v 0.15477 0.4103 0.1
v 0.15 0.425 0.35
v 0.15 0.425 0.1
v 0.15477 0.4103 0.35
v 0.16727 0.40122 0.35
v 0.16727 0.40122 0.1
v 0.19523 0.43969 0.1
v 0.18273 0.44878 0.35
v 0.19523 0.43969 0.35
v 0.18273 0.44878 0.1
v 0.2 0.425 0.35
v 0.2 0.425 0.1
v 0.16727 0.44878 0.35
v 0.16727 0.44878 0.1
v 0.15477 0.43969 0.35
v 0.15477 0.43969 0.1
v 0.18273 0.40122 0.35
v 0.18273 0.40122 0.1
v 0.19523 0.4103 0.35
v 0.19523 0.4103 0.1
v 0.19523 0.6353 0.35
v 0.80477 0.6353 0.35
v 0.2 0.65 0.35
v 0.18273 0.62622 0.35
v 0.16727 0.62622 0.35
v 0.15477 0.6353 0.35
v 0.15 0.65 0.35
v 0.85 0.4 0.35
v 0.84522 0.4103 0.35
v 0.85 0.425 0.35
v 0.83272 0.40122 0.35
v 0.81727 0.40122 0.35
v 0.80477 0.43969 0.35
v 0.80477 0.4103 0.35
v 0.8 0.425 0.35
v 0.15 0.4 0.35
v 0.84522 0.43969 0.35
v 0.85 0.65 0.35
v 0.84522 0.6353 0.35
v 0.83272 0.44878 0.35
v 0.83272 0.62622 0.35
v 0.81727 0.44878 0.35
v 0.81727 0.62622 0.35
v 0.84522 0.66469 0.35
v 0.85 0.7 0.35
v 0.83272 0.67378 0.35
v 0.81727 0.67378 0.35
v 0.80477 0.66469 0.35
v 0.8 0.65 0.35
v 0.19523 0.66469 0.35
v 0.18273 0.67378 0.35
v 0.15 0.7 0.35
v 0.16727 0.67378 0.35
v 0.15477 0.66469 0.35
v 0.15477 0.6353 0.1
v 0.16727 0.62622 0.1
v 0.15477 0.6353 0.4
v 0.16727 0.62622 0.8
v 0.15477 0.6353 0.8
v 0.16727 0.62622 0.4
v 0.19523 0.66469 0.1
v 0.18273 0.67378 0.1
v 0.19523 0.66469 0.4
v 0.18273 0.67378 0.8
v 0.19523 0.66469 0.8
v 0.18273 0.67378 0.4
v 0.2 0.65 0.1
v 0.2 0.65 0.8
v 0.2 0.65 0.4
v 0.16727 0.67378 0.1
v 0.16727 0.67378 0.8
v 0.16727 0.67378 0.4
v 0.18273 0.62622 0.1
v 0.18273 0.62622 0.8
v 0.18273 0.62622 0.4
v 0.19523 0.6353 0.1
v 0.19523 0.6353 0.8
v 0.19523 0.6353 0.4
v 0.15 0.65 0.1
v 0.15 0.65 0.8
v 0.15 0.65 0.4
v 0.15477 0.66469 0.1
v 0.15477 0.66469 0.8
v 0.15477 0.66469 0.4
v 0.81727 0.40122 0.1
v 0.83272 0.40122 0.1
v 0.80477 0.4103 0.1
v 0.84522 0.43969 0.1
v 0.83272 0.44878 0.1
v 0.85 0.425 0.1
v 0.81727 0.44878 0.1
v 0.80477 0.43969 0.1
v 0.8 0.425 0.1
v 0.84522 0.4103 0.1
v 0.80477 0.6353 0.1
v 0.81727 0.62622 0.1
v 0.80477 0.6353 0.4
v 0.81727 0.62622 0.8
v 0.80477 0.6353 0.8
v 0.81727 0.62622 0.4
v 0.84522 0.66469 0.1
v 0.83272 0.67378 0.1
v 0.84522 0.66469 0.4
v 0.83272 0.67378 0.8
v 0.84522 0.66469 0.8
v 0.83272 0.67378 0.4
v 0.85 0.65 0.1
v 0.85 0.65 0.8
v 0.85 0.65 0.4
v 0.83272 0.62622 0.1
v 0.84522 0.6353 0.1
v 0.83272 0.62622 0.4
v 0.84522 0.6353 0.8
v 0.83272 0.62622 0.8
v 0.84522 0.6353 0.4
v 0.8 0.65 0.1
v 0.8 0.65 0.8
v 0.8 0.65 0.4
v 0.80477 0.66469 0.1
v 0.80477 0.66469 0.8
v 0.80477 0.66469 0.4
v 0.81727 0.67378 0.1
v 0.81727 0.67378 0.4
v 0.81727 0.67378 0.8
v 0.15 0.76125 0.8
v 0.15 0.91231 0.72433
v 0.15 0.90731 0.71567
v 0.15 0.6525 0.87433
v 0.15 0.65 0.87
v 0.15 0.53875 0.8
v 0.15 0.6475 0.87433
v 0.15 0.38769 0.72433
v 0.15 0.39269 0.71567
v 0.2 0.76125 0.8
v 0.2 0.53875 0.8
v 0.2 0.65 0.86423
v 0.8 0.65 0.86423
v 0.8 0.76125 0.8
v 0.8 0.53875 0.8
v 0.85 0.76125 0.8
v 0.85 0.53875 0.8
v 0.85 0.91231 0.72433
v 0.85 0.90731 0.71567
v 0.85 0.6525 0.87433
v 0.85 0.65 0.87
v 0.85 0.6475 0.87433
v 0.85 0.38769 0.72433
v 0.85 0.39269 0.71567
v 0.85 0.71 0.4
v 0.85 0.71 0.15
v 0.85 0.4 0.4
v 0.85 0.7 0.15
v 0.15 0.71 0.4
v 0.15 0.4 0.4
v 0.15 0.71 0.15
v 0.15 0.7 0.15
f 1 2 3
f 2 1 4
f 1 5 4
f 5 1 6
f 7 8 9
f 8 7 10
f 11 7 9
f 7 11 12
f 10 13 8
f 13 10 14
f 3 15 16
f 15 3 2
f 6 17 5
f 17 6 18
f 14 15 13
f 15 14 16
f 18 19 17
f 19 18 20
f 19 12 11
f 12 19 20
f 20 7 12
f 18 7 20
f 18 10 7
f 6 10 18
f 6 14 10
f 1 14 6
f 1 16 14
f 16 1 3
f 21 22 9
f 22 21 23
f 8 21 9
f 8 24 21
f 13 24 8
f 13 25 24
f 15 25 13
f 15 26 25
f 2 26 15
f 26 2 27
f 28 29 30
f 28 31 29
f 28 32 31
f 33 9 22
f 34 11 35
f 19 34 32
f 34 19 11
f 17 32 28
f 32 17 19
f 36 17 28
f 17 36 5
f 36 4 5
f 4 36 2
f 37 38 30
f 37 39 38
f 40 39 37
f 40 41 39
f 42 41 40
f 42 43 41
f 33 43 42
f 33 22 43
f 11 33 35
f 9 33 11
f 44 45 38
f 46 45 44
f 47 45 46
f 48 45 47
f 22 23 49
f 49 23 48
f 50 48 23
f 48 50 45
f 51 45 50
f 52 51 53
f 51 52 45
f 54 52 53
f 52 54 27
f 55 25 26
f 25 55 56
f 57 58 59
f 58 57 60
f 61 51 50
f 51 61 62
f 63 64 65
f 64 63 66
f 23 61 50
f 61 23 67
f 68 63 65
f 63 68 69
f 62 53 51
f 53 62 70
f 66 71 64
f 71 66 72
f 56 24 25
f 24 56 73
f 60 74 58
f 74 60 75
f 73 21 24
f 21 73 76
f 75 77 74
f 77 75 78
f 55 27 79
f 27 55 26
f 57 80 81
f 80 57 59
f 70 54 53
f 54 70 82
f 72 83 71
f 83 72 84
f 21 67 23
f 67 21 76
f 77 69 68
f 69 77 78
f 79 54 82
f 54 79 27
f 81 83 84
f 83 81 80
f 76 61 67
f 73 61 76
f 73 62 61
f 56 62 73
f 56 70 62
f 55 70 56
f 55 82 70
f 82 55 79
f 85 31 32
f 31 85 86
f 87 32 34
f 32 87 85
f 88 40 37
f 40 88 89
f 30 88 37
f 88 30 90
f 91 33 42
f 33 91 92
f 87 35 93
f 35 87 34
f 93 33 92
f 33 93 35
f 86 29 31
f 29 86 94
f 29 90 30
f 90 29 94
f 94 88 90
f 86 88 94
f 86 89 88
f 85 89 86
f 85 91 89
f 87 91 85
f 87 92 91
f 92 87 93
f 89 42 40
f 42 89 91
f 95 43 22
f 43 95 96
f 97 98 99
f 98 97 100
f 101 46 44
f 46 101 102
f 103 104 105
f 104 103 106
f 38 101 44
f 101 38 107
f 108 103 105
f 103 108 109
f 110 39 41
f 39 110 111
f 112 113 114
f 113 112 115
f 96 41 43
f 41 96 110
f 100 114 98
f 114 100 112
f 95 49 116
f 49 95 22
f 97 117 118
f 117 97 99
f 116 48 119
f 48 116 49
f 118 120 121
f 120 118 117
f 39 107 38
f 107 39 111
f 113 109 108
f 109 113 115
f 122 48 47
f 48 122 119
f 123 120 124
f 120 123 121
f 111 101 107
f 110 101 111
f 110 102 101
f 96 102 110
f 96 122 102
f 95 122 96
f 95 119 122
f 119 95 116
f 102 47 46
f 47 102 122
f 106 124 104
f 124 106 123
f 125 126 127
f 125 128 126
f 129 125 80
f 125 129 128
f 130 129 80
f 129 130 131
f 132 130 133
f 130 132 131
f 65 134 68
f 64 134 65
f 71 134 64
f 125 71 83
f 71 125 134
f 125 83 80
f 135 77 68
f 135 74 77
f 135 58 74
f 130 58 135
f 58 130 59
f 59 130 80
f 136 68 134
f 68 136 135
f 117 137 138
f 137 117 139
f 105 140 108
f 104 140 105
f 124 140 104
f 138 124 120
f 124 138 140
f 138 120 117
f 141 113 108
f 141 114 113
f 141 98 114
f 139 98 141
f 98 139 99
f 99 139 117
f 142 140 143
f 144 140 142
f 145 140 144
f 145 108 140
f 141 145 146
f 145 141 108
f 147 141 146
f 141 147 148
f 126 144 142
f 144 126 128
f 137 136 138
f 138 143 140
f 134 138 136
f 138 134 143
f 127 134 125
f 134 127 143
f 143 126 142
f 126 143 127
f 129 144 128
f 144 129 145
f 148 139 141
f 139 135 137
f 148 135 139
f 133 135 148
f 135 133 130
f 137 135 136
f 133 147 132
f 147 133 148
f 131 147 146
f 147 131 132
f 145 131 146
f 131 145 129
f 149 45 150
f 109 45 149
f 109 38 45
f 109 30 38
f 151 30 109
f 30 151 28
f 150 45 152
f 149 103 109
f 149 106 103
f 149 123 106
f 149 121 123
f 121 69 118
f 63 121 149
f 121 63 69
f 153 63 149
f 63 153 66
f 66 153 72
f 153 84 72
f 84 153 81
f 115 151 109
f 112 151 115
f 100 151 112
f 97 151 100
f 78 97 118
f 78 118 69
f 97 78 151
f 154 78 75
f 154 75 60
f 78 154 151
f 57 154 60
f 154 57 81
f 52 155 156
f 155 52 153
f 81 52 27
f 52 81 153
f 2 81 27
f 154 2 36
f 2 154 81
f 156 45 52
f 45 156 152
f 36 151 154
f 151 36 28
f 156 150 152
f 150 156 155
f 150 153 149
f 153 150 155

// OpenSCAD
color([0.6, 0.4, 0.2])
translate([0.15, 0.4, 0.1]) {
    // Desk 
    translate([0,0,.25])
    cube([.7, 0.3, 0.05]);
    
    // Drape over the front
    translate([0,.3, .05])
    cube([.7, 0.01, .3-.05]);

    // Legs
    for(x=[0.025, 0.675]) {
        translate([x, 0.025, 0])
        cylinder(0.25, r=0.025, $fn=10);

        // Front legs go up to support the awning
        translate([x, 0.25, 0])
        cylinder(0.70, r=0.025, $fn=10);
    }
    
    
    for(x=[0.025, 0.675]) {       
        translate([x-0.025,0,0])
        rotate([90,0,90])
        linear_extrude(.05, false, convexity=1, twist=0, slices=5) {
            // I just eyeballed this. Sorry.
            polygon([[0.13, .70], [0.25, .77], [0.37, .70]]);
        }
    }

    // Awning 
    translate([0,.25,.75+.02])
    {
        rotate([-30,0,0])
        translate([0,0,-0.005])
        cube([.7, 0.3, 0.01]);

        rotate([180+30,0,0])
        translate([0,0,-0.005])
        cube([.7, 0.3, 0.01]);
    }

}
